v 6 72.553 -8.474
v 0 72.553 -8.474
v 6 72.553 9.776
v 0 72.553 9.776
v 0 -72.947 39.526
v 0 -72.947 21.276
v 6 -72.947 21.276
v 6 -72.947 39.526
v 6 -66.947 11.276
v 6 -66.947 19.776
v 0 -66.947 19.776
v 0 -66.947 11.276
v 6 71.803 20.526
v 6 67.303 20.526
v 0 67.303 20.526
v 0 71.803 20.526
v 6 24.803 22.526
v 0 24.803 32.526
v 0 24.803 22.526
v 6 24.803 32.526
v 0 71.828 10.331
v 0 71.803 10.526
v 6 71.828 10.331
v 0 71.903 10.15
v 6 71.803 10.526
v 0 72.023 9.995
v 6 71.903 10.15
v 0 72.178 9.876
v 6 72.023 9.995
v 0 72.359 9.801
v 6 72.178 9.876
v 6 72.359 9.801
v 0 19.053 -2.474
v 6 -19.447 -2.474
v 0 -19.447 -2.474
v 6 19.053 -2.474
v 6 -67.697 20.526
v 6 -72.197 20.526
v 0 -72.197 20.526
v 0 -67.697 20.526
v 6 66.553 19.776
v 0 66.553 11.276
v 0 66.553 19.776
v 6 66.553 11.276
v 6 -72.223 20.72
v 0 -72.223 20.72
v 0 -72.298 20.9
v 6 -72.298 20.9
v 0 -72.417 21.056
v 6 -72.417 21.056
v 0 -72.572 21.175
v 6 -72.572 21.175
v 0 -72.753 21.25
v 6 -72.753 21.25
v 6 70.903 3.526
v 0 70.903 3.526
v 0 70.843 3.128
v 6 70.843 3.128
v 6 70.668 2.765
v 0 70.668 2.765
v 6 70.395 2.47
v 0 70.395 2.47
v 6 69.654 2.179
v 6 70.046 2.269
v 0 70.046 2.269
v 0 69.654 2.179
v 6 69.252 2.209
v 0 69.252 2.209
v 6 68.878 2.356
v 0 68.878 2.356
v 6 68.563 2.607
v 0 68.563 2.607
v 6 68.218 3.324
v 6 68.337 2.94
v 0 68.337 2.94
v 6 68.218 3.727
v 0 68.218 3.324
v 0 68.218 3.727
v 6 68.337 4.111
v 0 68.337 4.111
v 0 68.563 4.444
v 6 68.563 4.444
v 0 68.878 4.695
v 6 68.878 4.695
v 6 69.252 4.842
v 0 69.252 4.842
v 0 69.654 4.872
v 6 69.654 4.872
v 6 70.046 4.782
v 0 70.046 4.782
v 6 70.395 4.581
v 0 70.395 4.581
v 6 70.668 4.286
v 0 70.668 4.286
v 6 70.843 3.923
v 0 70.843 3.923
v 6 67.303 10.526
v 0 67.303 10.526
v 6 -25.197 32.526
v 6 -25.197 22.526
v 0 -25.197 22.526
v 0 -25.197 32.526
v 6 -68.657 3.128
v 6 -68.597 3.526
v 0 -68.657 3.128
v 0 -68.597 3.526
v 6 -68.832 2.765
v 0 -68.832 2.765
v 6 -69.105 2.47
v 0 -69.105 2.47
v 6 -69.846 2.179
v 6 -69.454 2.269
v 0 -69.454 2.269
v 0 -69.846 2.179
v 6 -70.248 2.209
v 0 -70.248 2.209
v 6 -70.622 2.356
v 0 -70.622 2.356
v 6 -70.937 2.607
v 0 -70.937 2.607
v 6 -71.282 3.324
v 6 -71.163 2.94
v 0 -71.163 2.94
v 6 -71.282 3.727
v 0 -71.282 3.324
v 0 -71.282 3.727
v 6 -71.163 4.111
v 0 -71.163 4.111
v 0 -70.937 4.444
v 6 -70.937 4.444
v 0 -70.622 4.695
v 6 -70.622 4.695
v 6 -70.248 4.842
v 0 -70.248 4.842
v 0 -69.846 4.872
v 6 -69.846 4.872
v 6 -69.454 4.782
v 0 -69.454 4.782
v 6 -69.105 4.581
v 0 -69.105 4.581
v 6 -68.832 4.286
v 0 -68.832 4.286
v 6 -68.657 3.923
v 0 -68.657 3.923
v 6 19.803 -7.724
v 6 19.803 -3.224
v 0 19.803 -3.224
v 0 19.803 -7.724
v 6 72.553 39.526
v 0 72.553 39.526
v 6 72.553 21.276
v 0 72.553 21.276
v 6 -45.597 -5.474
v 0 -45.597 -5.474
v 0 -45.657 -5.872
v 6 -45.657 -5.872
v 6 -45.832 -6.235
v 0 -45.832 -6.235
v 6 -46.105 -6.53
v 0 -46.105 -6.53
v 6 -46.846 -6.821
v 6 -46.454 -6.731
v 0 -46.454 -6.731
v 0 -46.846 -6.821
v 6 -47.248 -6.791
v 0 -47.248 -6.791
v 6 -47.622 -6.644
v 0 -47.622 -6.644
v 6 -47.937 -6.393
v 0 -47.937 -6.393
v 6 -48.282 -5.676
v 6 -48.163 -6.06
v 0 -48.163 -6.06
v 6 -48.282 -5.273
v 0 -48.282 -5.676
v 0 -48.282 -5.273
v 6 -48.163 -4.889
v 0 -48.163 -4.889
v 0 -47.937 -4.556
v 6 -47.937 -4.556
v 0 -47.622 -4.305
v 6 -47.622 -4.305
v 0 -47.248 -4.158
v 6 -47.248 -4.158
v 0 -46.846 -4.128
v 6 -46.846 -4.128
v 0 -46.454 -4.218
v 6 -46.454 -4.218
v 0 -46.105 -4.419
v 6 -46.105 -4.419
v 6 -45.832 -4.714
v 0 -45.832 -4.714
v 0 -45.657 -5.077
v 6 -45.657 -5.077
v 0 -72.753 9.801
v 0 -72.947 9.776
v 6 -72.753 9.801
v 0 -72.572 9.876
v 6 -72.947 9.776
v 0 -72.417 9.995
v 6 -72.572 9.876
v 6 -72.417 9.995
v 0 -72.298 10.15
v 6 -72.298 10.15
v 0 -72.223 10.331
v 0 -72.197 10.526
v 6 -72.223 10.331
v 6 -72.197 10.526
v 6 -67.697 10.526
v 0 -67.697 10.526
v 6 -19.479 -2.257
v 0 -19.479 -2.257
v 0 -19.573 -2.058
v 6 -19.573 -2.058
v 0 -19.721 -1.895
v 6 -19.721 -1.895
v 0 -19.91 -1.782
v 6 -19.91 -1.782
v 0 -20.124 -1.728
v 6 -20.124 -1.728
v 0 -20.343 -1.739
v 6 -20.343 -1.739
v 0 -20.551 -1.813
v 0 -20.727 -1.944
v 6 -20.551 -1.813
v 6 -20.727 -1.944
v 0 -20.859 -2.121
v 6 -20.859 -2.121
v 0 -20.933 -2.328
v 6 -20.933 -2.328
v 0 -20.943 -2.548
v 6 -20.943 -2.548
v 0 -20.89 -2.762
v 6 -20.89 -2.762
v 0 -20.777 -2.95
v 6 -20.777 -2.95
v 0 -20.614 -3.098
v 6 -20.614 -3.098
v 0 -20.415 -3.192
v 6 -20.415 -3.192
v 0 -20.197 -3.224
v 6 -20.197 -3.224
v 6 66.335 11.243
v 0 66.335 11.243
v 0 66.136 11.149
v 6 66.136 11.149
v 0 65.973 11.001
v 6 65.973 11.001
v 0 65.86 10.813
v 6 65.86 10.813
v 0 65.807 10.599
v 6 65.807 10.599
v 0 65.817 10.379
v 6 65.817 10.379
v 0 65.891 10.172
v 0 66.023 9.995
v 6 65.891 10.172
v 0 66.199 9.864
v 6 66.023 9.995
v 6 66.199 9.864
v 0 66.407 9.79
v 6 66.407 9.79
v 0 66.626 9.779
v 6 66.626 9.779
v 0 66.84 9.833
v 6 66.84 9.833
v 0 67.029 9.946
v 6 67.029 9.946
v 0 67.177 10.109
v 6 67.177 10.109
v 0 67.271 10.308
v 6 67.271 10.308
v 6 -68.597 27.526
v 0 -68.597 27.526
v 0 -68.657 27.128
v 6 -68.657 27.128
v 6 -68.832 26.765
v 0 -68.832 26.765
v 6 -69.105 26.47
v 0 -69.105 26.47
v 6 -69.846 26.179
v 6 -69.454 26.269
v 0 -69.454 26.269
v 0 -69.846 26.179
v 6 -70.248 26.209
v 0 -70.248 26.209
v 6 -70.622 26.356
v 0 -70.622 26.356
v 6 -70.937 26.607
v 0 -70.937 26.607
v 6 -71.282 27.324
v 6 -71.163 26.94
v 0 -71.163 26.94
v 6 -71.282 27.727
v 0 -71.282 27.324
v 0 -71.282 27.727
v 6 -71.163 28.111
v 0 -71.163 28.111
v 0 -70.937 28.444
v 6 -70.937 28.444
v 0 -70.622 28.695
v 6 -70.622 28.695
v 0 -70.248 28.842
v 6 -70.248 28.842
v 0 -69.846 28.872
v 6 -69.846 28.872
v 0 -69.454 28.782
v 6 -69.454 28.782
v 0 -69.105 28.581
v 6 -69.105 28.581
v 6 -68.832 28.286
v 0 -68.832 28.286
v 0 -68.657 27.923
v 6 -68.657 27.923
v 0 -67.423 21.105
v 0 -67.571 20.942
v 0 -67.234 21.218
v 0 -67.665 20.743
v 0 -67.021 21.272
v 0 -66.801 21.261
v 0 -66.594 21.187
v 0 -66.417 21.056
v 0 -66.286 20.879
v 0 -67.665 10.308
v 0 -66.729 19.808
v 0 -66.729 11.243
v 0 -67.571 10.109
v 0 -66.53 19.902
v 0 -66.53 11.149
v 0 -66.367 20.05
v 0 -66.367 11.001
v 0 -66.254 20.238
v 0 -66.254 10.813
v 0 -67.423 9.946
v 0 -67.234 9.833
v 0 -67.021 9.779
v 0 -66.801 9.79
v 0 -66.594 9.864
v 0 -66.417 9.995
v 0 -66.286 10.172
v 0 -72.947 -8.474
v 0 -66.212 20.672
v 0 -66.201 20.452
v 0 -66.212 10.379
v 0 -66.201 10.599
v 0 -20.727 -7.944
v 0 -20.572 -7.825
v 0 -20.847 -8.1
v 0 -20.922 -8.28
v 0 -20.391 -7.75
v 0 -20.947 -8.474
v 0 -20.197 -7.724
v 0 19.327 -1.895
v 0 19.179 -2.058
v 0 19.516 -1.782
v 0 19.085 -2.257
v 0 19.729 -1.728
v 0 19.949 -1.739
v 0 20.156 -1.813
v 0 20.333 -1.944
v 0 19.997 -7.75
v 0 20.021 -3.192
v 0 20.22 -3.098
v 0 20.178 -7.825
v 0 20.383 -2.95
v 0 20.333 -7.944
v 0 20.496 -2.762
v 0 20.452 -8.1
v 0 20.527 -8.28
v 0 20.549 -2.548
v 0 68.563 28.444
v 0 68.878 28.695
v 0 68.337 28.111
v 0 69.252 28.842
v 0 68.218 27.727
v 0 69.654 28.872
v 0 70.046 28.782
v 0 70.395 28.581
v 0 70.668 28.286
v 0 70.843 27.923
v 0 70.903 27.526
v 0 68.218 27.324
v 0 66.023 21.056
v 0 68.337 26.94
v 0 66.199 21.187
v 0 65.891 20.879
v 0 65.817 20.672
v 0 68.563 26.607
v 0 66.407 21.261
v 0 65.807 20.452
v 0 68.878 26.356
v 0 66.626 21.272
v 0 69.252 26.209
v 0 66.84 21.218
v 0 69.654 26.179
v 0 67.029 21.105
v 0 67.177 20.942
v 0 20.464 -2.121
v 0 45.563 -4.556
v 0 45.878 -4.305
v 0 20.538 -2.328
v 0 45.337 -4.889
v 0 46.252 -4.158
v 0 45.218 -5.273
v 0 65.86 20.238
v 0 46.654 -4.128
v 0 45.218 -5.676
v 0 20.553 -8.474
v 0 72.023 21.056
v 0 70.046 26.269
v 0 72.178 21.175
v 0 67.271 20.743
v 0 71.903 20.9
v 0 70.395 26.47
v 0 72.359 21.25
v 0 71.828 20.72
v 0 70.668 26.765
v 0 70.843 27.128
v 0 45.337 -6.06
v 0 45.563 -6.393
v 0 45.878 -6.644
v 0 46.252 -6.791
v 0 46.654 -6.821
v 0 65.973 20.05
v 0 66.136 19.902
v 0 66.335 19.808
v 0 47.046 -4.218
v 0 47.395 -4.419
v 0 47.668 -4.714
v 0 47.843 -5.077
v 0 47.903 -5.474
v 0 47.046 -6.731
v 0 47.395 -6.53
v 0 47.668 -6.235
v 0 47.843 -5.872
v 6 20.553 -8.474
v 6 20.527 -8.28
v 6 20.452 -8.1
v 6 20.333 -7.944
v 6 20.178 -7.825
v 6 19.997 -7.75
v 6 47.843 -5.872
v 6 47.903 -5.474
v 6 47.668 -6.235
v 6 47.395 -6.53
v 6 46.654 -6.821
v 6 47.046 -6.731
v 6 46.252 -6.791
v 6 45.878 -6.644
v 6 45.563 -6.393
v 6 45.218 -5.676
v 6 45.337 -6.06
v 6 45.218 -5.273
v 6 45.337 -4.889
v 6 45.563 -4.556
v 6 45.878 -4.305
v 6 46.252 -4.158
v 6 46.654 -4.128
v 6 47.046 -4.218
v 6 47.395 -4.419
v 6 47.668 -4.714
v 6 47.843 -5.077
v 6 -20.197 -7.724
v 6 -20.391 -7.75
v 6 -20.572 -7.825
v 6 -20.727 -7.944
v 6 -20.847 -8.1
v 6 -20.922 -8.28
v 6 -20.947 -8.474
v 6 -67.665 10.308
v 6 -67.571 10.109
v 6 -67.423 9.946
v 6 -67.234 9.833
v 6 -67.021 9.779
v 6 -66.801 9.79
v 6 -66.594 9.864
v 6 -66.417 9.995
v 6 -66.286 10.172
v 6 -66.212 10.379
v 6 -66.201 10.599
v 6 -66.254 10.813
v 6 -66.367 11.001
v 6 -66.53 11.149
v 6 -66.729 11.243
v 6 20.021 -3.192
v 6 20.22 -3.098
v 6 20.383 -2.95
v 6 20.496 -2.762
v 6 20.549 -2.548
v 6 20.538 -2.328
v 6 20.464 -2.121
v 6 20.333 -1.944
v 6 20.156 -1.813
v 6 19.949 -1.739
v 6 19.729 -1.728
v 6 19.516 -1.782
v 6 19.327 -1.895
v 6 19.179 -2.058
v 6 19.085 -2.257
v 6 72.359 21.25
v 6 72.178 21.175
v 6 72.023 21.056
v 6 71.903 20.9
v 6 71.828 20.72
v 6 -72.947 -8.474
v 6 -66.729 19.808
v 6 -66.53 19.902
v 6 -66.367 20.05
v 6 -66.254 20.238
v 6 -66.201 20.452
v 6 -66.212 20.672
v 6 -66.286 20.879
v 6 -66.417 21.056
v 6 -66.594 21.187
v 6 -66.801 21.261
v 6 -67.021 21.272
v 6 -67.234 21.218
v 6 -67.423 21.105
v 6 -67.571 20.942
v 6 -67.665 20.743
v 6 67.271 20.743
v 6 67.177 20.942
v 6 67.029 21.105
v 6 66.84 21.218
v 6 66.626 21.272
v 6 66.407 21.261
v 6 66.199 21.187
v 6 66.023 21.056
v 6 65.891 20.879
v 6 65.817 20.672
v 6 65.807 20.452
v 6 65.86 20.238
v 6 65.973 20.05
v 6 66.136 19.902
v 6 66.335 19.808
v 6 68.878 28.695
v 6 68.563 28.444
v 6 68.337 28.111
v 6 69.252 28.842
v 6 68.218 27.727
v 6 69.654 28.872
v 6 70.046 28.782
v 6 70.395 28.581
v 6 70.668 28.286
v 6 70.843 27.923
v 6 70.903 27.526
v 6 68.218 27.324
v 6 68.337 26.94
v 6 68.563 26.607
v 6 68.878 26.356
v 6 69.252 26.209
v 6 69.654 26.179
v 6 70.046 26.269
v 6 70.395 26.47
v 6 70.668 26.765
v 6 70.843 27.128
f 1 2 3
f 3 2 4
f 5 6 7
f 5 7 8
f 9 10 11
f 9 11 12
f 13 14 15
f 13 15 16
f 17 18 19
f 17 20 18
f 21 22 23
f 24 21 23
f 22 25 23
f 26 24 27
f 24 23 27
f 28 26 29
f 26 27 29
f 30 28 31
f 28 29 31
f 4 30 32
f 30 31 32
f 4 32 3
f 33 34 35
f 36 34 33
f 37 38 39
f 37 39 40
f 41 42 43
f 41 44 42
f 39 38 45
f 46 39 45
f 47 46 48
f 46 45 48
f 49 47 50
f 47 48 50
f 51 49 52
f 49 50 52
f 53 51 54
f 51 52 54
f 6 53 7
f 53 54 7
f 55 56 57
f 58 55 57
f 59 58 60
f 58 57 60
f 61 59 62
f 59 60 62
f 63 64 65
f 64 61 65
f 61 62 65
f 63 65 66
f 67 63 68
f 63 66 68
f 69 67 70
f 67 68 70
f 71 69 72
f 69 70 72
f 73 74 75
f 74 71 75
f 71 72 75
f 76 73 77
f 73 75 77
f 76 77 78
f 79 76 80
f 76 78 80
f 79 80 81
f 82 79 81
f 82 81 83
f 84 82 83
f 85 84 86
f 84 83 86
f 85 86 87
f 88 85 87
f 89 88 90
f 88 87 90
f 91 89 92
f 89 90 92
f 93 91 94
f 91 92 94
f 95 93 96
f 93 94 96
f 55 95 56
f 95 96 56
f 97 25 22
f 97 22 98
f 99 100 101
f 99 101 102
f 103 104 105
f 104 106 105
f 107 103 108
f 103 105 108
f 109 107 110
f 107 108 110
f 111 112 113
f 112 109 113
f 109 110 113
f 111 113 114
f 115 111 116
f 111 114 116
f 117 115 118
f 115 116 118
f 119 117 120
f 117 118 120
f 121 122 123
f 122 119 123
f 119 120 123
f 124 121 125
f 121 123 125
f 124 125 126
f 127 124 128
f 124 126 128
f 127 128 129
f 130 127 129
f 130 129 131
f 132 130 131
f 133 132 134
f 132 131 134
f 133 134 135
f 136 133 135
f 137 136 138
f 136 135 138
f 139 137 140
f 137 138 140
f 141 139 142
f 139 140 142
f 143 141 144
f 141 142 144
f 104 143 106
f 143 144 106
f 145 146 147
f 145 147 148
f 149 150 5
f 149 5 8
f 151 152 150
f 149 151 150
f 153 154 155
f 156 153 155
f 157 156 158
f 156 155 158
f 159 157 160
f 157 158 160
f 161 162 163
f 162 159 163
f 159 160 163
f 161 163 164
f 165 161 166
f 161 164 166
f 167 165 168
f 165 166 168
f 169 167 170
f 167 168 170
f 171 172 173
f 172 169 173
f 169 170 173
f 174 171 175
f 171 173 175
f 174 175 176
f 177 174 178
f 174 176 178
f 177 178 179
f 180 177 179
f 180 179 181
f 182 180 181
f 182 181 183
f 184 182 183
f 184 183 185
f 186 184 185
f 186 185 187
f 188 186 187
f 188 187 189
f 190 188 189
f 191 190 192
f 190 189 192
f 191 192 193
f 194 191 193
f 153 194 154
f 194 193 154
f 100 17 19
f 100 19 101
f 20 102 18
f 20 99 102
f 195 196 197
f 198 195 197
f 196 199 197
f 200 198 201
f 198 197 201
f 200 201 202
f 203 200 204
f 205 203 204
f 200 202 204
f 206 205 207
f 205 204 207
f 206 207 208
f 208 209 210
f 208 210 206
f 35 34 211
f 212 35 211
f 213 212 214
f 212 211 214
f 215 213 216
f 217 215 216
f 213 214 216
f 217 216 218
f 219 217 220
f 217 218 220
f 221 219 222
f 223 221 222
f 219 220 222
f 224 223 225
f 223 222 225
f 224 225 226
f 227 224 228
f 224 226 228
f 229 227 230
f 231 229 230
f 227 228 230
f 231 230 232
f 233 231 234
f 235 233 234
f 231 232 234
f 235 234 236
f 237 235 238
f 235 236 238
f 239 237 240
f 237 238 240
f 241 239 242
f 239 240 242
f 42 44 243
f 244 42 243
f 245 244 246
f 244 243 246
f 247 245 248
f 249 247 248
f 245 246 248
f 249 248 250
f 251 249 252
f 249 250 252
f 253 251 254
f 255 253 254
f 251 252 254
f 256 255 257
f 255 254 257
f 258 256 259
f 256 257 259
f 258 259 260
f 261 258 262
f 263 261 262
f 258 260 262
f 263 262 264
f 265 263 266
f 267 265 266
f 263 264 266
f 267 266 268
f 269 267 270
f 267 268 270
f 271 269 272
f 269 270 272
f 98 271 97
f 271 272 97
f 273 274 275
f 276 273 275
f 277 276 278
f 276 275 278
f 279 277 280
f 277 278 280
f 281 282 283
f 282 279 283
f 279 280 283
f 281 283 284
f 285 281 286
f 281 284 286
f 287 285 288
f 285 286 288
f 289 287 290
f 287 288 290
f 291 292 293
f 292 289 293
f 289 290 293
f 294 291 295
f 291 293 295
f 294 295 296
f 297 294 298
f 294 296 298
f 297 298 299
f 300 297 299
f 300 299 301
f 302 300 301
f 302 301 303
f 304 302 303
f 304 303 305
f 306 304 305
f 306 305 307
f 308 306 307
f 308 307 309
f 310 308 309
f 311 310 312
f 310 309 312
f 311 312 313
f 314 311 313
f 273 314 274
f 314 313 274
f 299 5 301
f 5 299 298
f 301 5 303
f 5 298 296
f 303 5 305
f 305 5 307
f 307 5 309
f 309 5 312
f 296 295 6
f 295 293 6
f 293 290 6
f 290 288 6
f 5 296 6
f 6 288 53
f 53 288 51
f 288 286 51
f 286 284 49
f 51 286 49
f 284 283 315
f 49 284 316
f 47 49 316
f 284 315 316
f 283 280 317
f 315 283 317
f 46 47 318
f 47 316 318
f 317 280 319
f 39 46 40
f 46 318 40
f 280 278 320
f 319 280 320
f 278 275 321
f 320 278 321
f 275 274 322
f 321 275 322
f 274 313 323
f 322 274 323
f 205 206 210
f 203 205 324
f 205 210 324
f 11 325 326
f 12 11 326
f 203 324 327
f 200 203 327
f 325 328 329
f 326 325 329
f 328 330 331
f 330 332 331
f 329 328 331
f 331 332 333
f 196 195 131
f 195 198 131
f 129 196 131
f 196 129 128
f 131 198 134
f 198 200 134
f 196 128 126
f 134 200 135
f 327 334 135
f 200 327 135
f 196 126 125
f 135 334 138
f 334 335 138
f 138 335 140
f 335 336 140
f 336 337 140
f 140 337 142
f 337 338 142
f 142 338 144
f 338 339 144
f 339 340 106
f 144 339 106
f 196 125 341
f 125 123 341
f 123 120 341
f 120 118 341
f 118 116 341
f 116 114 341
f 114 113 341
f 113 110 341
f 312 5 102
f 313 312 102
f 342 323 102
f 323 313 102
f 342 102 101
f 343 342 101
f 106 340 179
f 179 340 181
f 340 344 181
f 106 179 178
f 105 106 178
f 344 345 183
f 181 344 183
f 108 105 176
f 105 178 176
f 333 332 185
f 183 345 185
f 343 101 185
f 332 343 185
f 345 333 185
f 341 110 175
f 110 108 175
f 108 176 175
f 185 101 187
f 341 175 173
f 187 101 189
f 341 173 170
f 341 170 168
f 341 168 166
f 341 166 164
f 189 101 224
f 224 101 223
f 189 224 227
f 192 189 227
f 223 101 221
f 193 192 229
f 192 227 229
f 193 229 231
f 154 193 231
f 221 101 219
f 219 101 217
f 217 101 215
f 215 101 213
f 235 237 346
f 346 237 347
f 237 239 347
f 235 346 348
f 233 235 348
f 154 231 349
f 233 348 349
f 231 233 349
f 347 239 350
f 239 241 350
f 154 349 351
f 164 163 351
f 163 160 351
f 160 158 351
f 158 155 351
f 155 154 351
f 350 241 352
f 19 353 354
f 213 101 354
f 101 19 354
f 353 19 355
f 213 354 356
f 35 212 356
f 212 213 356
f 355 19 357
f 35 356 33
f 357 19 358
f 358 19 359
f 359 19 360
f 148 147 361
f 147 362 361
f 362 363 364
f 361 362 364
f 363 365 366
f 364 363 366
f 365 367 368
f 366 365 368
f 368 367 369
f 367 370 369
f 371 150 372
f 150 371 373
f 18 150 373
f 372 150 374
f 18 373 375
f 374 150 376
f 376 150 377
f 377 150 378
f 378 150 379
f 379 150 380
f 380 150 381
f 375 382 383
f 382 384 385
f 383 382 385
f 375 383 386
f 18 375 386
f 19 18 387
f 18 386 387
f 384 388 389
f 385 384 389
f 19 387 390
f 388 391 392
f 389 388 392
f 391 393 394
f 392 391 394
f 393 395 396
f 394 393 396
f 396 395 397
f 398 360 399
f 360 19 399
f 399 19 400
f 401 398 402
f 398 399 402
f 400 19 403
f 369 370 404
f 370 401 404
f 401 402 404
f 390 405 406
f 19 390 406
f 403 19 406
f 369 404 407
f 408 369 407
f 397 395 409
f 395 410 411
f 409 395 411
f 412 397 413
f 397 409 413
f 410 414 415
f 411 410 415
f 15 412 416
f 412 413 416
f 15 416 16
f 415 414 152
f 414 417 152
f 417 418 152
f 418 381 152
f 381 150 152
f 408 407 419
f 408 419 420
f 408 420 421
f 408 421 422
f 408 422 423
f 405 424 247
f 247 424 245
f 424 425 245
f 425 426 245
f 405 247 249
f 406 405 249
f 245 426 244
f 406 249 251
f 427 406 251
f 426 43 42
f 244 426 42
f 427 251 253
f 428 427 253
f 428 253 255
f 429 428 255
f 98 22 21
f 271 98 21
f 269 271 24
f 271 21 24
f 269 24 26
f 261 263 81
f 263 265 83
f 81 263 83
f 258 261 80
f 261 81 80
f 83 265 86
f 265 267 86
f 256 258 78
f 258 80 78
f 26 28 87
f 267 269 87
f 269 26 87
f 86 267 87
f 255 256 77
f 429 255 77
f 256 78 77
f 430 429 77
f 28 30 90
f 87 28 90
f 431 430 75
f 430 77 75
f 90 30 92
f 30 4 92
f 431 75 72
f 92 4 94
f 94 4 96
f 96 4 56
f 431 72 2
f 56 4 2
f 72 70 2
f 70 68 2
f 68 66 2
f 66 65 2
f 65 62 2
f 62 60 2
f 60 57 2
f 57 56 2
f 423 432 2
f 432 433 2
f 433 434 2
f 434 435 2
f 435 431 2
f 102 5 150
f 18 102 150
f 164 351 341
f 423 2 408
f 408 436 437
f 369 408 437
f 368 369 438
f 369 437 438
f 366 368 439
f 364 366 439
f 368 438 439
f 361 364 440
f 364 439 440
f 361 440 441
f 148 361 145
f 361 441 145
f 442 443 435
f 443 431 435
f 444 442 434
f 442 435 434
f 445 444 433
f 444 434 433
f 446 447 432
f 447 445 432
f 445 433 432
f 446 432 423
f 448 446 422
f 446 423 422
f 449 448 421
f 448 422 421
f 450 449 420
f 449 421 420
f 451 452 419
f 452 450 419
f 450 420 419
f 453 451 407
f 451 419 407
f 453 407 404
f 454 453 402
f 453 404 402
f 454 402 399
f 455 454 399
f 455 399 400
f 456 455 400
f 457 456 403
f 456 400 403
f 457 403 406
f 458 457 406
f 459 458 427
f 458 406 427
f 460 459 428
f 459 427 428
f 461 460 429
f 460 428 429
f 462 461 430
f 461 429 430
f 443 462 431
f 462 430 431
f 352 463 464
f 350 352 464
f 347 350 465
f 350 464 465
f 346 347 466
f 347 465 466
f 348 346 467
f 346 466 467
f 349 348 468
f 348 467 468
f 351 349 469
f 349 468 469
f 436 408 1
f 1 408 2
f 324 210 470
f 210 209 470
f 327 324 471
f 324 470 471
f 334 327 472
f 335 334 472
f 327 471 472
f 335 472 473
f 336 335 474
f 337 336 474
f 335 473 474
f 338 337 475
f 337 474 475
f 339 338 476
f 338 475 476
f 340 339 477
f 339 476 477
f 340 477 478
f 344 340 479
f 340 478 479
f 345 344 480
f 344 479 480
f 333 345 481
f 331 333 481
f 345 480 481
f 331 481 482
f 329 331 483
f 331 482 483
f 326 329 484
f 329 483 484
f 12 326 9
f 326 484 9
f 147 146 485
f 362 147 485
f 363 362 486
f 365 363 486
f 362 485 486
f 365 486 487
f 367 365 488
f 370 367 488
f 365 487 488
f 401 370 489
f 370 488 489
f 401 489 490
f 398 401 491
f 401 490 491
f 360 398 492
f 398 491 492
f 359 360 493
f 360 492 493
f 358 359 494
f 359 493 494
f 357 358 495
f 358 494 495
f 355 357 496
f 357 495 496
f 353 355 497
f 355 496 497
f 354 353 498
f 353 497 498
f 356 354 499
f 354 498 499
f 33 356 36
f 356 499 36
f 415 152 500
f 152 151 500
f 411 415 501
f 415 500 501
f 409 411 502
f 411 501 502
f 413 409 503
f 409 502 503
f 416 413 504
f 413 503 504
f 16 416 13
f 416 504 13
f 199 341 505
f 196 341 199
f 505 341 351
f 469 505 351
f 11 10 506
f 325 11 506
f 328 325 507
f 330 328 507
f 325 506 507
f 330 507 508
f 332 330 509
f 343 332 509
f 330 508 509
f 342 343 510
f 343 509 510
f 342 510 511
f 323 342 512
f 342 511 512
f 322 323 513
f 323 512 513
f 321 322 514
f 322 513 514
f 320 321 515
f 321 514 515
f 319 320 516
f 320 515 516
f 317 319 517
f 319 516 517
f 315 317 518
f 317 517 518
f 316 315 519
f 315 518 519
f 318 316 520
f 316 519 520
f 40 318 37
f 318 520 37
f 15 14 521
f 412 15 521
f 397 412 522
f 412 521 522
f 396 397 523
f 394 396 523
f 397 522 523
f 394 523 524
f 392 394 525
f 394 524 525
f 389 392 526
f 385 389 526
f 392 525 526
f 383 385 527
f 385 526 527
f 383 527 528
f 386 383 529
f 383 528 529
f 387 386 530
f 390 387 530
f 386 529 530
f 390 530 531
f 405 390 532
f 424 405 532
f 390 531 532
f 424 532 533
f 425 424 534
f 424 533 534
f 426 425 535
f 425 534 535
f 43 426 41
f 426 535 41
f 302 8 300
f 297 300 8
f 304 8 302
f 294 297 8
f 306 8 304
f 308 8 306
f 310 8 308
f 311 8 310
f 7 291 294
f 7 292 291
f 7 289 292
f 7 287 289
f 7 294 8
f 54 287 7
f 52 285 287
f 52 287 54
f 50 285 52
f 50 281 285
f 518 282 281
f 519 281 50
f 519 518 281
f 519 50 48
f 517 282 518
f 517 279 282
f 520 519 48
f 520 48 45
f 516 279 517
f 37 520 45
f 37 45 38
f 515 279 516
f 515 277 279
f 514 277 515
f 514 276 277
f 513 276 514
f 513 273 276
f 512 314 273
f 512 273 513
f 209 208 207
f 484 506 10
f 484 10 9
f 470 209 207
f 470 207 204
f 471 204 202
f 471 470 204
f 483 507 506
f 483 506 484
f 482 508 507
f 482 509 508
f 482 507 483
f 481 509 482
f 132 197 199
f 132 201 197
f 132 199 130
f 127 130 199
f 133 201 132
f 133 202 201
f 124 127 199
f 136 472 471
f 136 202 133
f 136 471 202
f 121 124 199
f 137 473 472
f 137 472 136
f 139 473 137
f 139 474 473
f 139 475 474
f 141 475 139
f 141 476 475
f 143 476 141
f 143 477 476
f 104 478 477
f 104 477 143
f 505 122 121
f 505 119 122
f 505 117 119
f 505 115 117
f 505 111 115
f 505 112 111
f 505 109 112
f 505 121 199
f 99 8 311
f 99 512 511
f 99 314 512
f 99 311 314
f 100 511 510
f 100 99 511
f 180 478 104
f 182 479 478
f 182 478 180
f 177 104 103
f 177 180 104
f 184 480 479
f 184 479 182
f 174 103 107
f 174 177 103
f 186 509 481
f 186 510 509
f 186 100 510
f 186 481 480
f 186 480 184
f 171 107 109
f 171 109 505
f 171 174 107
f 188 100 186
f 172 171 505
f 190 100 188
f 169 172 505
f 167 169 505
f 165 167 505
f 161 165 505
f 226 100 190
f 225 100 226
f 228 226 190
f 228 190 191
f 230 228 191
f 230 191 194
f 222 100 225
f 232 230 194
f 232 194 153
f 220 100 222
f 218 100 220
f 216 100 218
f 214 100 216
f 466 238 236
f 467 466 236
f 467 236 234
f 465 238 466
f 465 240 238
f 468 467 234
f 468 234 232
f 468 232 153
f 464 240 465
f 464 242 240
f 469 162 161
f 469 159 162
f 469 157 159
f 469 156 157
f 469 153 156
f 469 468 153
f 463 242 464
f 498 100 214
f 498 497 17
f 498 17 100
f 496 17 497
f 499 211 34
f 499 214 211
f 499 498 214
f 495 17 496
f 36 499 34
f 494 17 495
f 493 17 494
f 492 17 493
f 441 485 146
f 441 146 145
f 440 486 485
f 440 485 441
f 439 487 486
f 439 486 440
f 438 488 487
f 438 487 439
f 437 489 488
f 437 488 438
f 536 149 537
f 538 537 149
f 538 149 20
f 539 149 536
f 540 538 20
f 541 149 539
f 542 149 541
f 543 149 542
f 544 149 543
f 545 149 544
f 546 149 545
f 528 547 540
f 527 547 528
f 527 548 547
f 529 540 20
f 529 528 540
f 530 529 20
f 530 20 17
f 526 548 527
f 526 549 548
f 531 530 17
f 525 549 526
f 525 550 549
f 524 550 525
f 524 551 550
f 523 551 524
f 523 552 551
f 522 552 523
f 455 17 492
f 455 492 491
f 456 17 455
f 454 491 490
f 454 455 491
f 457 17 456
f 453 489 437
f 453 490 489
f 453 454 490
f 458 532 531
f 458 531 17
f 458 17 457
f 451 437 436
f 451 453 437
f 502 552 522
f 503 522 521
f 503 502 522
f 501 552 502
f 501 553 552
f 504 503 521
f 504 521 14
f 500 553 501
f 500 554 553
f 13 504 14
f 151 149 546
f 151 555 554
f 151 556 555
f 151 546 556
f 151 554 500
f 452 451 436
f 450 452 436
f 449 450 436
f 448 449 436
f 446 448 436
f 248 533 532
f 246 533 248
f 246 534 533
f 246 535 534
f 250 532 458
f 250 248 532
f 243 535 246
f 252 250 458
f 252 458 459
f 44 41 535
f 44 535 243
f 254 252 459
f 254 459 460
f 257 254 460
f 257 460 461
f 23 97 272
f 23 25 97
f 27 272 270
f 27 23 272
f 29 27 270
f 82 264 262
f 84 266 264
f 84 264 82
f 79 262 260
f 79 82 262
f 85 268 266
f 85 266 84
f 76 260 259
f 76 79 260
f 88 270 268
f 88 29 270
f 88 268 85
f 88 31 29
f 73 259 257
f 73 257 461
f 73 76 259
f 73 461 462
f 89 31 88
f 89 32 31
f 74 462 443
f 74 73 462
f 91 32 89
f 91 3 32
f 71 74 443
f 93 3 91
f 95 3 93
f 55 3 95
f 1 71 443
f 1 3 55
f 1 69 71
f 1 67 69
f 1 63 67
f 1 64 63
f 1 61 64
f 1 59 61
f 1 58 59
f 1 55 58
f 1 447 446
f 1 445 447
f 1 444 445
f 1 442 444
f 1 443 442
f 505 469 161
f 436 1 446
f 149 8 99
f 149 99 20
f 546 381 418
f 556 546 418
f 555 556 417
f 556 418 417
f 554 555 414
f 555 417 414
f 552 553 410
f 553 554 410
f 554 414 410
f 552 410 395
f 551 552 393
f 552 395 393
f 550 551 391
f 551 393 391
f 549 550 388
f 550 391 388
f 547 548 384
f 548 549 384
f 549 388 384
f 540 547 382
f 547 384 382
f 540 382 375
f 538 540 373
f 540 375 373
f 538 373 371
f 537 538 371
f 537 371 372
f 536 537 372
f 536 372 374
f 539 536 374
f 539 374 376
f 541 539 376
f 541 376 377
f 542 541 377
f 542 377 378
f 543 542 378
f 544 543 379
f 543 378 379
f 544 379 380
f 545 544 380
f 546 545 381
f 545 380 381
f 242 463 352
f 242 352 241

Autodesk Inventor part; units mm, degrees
ref_plane "YZ Plane" through (0, 0, 0) normal (1, 0, 0) x (0, 1, 0)
ref_plane "XZ Plane" through (0, 0, 0) normal (0, 1, 0) x (-1, 0, 0)
ref_plane "XY Plane" through (0, 0, 0) normal (0, 0, 1) x (1, 0, 0)
sketch "스케치1" plane through (0, 0, 0) normal (1, 0, 0) x (0, 1, 0)
  circle A0 centre (46.5529, -5.4745) radius 1.35
  circle A1 centre (-46.9471, -5.4745) radius 1.35
  line L0 (-66.9471, -8.4745) -> (66.5529, -8.4745)
  line L1 (66.5529, -8.4745) -> (66.5529, -2.4745)
  line L2 (-66.9471, -2.4745) -> (66.5529, -2.4745)
  line L3 (-66.9471, -8.4745) -> (-66.9471, -2.4745)
  circle A2 centre (-69.9471, 3.5255) radius 1.35
  circle A3 centre (-69.9471, 27.5255) radius 1.35
  line L4 (-66.9471, -8.4745) -> (-66.9471, 39.5255)
  line L5 (-66.9471, 39.5255) -> (-72.9471, 39.5255)
  line L6 (-72.9471, -8.4745) -> (-72.9471, 39.5255)
  line L7 (-66.9471, -8.4745) -> (-72.9471, -8.4745)
  circle A4 centre (69.5529, 3.5255) radius 1.35
  circle A5 centre (69.5529, 27.5255) radius 1.35
  line L8 (72.5529, -8.4745) -> (72.5529, 39.5255)
  line L9 (72.5529, 39.5255) -> (66.5529, 39.5255)
  line L10 (66.5529, -8.4745) -> (66.5529, 39.5255)
  line L11 (72.5529, -8.4745) -> (66.5529, -8.4745)
  point P0 (0, 0)
extrude "돌출1" add sketch "스케치1" along normal blind 6
sketch "스케치3" plane through (0, 66.5529, -2.4745) normal (0, -1, 0) x (1, 0, 0)
  line L0 (0, 42) -> (0, -6) projected
  line L1 (0, 42) -> (0, -6) projected
  line L2 (0, -6) -> (6, -6) projected
  line L3 (6, 42) -> (6, -6) projected
  line L4 (0, 42) -> (6, 42) projected
  line L5 (0, 0) -> (6, 0) projected
  point P0 (0, 2.4745)
  point P1 (0, -6)
extrude "돌출2" add sketch "스케치3" along normal up to surface (133.5 mm away) contours L4 L3 L5 L0
sketch "스케치4" plane through (6, 0, 0) normal (1, 0, 0) x (0, 0, -1)
  line L0 (-39.5255, 72.5529) -> (-39.5255, -72.9471) projected
  line L1 (-39.5255, -72.9471) -> (8.4745, -72.9471) projected
  line L2 (8.4745, -72.9471) -> (8.4745, 72.5529) projected
  line L3 (8.4745, 72.5529) -> (-39.5255, 72.5529) projected
  circle A0 centre (-3.5255, -69.9471) radius 1.35 projected
  circle A1 centre (-27.5255, -69.9471) radius 1.35 projected
  circle A2 centre (5.4745, 46.5529) radius 1.35 projected
  circle A3 centre (5.4745, -46.9471) radius 1.35 projected
  circle A4 centre (-3.5255, 69.5529) radius 1.35 projected
  circle A5 centre (-27.5255, 69.5529) radius 1.35 projected
  line L4 (-20.0255, -25.1971) -> (-35.0255, -25.1971)
  line L5 (-35.0255, -25.1971) -> (-35.0255, 24.8029)
  line L6 (-35.0255, 24.8029) -> (-20.0255, 24.8029)
  line L7 (-20.0255, 24.8029) -> (-20.0255, -25.1971)
  line L8 (-20.0255, -25.1971) -> (-35.0255, 24.8029) construction
  line L9 (-35.0255, -25.1971) -> (-20.0255, 24.8029) construction
  line L10 (-22.5255, -25.1971) -> (-32.5255, -25.1971)
  line L11 (-32.5255, -25.1971) -> (-32.5255, 24.8029)
  line L12 (-32.5255, 24.8029) -> (-22.5255, 24.8029)
  line L13 (-22.5255, 24.8029) -> (-22.5255, -25.1971)
  line L14 (-22.5255, -25.1971) -> (-32.5255, 24.8029) construction
  line L15 (-32.5255, -25.1971) -> (-22.5255, 24.8029) construction
  point P0 (0, 0)
  point P1 (-27.5255, -0.1971)
  dimension "d4" = 15
  dimension "d5" = 50
  dimension "d8" = 10
  dimension "d9" = 50
extrude "돌출3" cut sketch "스케치4" against normal blind 10 contours L4 L11 L6 L13
sketch "스케치5" plane through (6, 0, 0) normal (1, 0, 0) x (0, 0, -1)
  line L0 (-32.5255, -25.1971) -> (-32.5255, 24.8029) projected
  line L1 (-32.5255, 24.8029) -> (-22.5255, 24.8029) projected
  line L2 (-22.5255, 24.8029) -> (-22.5255, -25.1971) projected
  line L3 (-22.5255, -25.1971) -> (-32.5255, -25.1971) projected
  line L4 (-39.5255, 72.5529) -> (-39.5255, -72.9471) projected
  line L5 (-39.5255, -72.9471) -> (8.4745, -72.9471) projected
  line L6 (8.4745, -72.9471) -> (8.4745, 72.5529) projected
  line L7 (8.4745, 72.5529) -> (-39.5255, 72.5529) projected
  circle A0 centre (-3.5255, -69.9471) radius 1.35 projected
  circle A1 centre (-27.5255, -69.9471) radius 1.35 projected
  circle A2 centre (5.4745, 46.5529) radius 1.35 projected
  circle A3 centre (5.4745, -46.9471) radius 1.35 projected
  circle A4 centre (-3.5255, 69.5529) radius 1.35 projected
  circle A5 centre (-27.5255, 69.5529) radius 1.35 projected
  line L8 (-10.5255, -72.9471) -> (-20.5255, -72.9471)
  line L9 (-20.5255, -72.9471) -> (-20.5255, -66.9471)
  line L10 (-20.5255, -66.9471) -> (-10.5255, -66.9471)
  line L11 (-10.5255, -66.9471) -> (-10.5255, -72.9471)
  line L12 (-10.5255, -72.9471) -> (-20.5255, -66.9471) construction
  line L13 (-20.5255, -72.9471) -> (-10.5255, -66.9471) construction
  line L14 (-10.5255, 66.5529) -> (-20.5255, 66.5529)
  line L15 (-20.5255, 66.5529) -> (-20.5255, 72.5529)
  line L16 (-20.5255, 72.5529) -> (-10.5255, 72.5529)
  line L17 (-10.5255, 72.5529) -> (-10.5255, 66.5529)
  line L18 (-10.5255, 66.5529) -> (-20.5255, 72.5529) construction
  line L19 (-20.5255, 66.5529) -> (-10.5255, 72.5529) construction
  circle A6 centre (-20.5255, 72.5529) radius 0.75
  circle A7 centre (-20.5255, 66.5529) radius 0.75
  circle A8 centre (-10.5255, 66.5529) radius 0.75
  circle A9 centre (-10.5255, 72.5529) radius 0.75
  circle A10 centre (-20.5255, -66.9471) radius 0.75
  circle A11 centre (-20.5255, -72.9471) radius 0.75
  circle A12 centre (-10.5255, -72.9471) radius 0.75
  circle A13 centre (-10.5255, -66.9471) radius 0.75
  point P0 (0, 0)
  point P1 (-15.5255, -69.9471)
  point P2 (-15.5255, 69.5529)
  point P3 (-20.5255, -72.1971)
  point P4 (-19.7755, -72.9471)
  point P5 (-11.2755, -72.9471)
  point P6 (-10.5255, -72.1971)
  point P7 (-10.5255, -67.6971)
  point P8 (-11.2755, -66.9471)
  point P9 (-19.7755, -66.9471)
  point P10 (-20.5255, -67.6971)
  point P11 (-20.5255, 71.8029)
  point P12 (-20.5255, 67.3029)
  point P13 (-19.7755, 66.5529)
  point P14 (-11.2755, 66.5529)
  point P15 (-10.5255, 67.3029)
  point P16 (-10.5255, 71.8029)
  point P17 (-11.2755, 72.5529)
  point P18 (-19.7755, 72.5529)
  dimension "d10" = 10
  dimension "d11" = 6
  dimension "d12" = 10
  dimension "d13" = 1.5
  dimension "d14" = 1.5
  dimension "d15" = 1.5
  dimension "d16" = 1.5
  dimension "d17" = 1.5
  dimension "d18" = 1.5
  dimension "d19" = 1.5
  dimension "d20" = 1.5
extrude "돌출4" cut sketch "스케치5" against normal blind 10 contours A6 L7 | L7 L15 A6 | A11 L9 L5 | L5 A11 | L7 A6 L15 | L7 A9 L17 A8 L14 A7 L15 A6 | L9 A11 L5 | L9 A10 L10 A13 L11 A12 L5 A11 | A9 L7 | L7 L17 A9 | A7 L14 L15 | L15 L14 A7 | A10 L10 L9 | L9 L10 A10 | A12 L11 L5 | L5 A12 | L7 A9 L17 | L11 A12 L5 | A8 L14 L17 | L17 L14 A8 | A13 L11 L10 | L10 L11 A13
sketch "스케치6" plane through (6, 0, 0) normal (1, 0, 0) x (0, 0, -1)
  arc A0 (-9.7755, -72.9471) -> (-10.5255, -72.1971) centre (-10.5255, -72.9471) ccw projected
  line L0 (-9.7755, -72.9471) -> (8.4745, -72.9471) projected
  line L1 (8.4745, -72.9471) -> (8.4745, 72.5529) projected
  line L2 (8.4745, 72.5529) -> (-9.7755, 72.5529) projected
  arc A1 (-10.5255, 71.8029) -> (-9.7755, 72.5529) centre (-10.5255, 72.5529) ccw projected
  line L3 (-10.5255, 71.8029) -> (-10.5255, 67.3029) projected
  arc A2 (-11.2755, 66.5529) -> (-10.5255, 67.3029) centre (-10.5255, 66.5529) ccw projected
  line L4 (-11.2755, 66.5529) -> (-19.7755, 66.5529) projected
  arc A3 (-20.5255, 67.3029) -> (-19.7755, 66.5529) centre (-20.5255, 66.5529) ccw projected
  line L5 (-20.5255, 67.3029) -> (-20.5255, 71.8029) projected
  arc A4 (-21.2755, 72.5529) -> (-20.5255, 71.8029) centre (-20.5255, 72.5529) ccw projected
  line L6 (-21.2755, 72.5529) -> (-39.5255, 72.5529) projected
  line L7 (-39.5255, 72.5529) -> (-39.5255, -72.9471) projected
  line L8 (-39.5255, -72.9471) -> (-21.2755, -72.9471) projected
  arc A5 (-20.5255, -72.1971) -> (-21.2755, -72.9471) centre (-20.5255, -72.9471) ccw projected
  line L9 (-20.5255, -72.1971) -> (-20.5255, -67.6971) projected
  arc A6 (-19.7755, -66.9471) -> (-20.5255, -67.6971) centre (-20.5255, -66.9471) ccw projected
  line L10 (-19.7755, -66.9471) -> (-11.2755, -66.9471) projected
  arc A7 (-10.5255, -67.6971) -> (-11.2755, -66.9471) centre (-10.5255, -66.9471) ccw projected
  line L11 (-10.5255, -67.6971) -> (-10.5255, -72.1971) projected
  line L12 (-32.5255, -25.1971) -> (-32.5255, 24.8029) projected
  line L13 (-32.5255, 24.8029) -> (-22.5255, 24.8029) projected
  line L14 (-22.5255, 24.8029) -> (-22.5255, -25.1971) projected
  line L15 (-22.5255, -25.1971) -> (-32.5255, -25.1971) projected
  circle A8 centre (-3.5255, -69.9471) radius 1.35 projected
  circle A9 centre (-27.5255, -69.9471) radius 1.35 projected
  circle A10 centre (5.4745, 46.5529) radius 1.35 projected
  circle A11 centre (5.4745, -46.9471) radius 1.35 projected
  circle A12 centre (-3.5255, 69.5529) radius 1.35 projected
  circle A13 centre (-27.5255, 69.5529) radius 1.35 projected
  line L16 (8.4745, -72.9471) -> (8.4745, 72.5529) projected
  line L17 (8.4745, -0.1971) -> (5.4745, -0.1971)
  line L18 (2.4745, 19.8029) -> (8.4745, 19.8029)
  line L19 (8.4745, 19.8029) -> (8.4745, -20.1971)
  line L20 (8.4745, -20.1971) -> (2.4745, -20.1971)
  line L21 (2.4745, -20.1971) -> (2.4745, 19.8029)
  line L22 (2.4745, 19.8029) -> (8.4745, -20.1971) construction
  line L23 (8.4745, 19.8029) -> (2.4745, -20.1971) construction
  circle A14 centre (2.4745, -20.1971) radius 0.75
  circle A15 centre (2.4745, 19.8029) radius 0.75
  circle A16 centre (8.4745, 19.8029) radius 0.75
  circle A17 centre (8.4745, -20.1971) radius 0.75
  point P0 (0, 0)
  point P1 (8.4745, 20.5529)
  point P2 (7.7245, 19.8029)
  point P3 (3.2245, 19.8029)
  point P4 (2.4745, 19.0529)
  point P5 (7.7245, -20.1971)
  point P6 (8.4745, -19.4471)
  point P7 (2.4745, -19.4471)
  point P8 (3.2245, -20.1971)
  dimension "d23" = 3
  dimension "d24" = 40
  dimension "d27" = 1.5
  dimension "d28" = 1.5
  dimension "d29" = 1.5
  dimension "d30" = 1.5
extrude "돌출5" cut sketch "스케치6" against normal blind 10 contours A17 L20 L1 | L1 A17 | L20 A17 L1 | L20 A14 L21 A15 L18 A16 L1 A17 | A14 L21 L20 | L20 L21 A14 | A16 L18 L1 | A15 L18 L21 | L21 L18 A15 | L18 A16 L1
properties part number "frame_upper4"
